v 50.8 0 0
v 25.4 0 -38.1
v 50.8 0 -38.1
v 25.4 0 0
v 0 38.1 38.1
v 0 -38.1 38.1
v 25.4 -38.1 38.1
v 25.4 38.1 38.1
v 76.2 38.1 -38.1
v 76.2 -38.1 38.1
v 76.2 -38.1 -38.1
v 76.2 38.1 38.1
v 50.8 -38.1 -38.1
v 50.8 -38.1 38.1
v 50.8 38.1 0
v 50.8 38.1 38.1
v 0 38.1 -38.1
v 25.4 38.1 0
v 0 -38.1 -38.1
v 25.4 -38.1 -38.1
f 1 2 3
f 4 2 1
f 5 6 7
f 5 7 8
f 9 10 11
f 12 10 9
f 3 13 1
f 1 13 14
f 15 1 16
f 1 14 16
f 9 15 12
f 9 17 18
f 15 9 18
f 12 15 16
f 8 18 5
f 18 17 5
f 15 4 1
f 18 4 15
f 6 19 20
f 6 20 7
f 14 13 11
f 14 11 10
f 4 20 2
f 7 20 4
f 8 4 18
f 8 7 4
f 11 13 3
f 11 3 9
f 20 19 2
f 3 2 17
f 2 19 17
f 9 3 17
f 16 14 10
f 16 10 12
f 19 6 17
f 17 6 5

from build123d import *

# Parameters (mm, degrees)
F0_W     = 76.2
F0_H     = 76.2
F1_DEPTH = 25.4
F2_W     = 38.1
F2_H     = 38.1
F3_DEPTH = 25.4
F4_W     = 76.2
F4_H     = 76.2
F5_DEPTH = 25.4


with BuildPart() as f1:
    # F0 (on Right) → F1 (new body)
    with BuildSketch(Plane.YZ):
        Rectangle(F0_W, F0_H)
    extrude(amount=F1_DEPTH)

    # F2 (on face) → F3 (join)
    with BuildSketch(Plane.YZ.offset(25.4)):
        with Locations((19.05, -19.05)):
            Rectangle(F2_W, F2_H)
    extrude(amount=F3_DEPTH)

    # F4 (on face) → F5 (join)
    with BuildSketch(Plane.YZ.offset(50.8)):
        Rectangle(F4_W, F4_H)
    extrude(amount=F5_DEPTH)


solid = f1.part
